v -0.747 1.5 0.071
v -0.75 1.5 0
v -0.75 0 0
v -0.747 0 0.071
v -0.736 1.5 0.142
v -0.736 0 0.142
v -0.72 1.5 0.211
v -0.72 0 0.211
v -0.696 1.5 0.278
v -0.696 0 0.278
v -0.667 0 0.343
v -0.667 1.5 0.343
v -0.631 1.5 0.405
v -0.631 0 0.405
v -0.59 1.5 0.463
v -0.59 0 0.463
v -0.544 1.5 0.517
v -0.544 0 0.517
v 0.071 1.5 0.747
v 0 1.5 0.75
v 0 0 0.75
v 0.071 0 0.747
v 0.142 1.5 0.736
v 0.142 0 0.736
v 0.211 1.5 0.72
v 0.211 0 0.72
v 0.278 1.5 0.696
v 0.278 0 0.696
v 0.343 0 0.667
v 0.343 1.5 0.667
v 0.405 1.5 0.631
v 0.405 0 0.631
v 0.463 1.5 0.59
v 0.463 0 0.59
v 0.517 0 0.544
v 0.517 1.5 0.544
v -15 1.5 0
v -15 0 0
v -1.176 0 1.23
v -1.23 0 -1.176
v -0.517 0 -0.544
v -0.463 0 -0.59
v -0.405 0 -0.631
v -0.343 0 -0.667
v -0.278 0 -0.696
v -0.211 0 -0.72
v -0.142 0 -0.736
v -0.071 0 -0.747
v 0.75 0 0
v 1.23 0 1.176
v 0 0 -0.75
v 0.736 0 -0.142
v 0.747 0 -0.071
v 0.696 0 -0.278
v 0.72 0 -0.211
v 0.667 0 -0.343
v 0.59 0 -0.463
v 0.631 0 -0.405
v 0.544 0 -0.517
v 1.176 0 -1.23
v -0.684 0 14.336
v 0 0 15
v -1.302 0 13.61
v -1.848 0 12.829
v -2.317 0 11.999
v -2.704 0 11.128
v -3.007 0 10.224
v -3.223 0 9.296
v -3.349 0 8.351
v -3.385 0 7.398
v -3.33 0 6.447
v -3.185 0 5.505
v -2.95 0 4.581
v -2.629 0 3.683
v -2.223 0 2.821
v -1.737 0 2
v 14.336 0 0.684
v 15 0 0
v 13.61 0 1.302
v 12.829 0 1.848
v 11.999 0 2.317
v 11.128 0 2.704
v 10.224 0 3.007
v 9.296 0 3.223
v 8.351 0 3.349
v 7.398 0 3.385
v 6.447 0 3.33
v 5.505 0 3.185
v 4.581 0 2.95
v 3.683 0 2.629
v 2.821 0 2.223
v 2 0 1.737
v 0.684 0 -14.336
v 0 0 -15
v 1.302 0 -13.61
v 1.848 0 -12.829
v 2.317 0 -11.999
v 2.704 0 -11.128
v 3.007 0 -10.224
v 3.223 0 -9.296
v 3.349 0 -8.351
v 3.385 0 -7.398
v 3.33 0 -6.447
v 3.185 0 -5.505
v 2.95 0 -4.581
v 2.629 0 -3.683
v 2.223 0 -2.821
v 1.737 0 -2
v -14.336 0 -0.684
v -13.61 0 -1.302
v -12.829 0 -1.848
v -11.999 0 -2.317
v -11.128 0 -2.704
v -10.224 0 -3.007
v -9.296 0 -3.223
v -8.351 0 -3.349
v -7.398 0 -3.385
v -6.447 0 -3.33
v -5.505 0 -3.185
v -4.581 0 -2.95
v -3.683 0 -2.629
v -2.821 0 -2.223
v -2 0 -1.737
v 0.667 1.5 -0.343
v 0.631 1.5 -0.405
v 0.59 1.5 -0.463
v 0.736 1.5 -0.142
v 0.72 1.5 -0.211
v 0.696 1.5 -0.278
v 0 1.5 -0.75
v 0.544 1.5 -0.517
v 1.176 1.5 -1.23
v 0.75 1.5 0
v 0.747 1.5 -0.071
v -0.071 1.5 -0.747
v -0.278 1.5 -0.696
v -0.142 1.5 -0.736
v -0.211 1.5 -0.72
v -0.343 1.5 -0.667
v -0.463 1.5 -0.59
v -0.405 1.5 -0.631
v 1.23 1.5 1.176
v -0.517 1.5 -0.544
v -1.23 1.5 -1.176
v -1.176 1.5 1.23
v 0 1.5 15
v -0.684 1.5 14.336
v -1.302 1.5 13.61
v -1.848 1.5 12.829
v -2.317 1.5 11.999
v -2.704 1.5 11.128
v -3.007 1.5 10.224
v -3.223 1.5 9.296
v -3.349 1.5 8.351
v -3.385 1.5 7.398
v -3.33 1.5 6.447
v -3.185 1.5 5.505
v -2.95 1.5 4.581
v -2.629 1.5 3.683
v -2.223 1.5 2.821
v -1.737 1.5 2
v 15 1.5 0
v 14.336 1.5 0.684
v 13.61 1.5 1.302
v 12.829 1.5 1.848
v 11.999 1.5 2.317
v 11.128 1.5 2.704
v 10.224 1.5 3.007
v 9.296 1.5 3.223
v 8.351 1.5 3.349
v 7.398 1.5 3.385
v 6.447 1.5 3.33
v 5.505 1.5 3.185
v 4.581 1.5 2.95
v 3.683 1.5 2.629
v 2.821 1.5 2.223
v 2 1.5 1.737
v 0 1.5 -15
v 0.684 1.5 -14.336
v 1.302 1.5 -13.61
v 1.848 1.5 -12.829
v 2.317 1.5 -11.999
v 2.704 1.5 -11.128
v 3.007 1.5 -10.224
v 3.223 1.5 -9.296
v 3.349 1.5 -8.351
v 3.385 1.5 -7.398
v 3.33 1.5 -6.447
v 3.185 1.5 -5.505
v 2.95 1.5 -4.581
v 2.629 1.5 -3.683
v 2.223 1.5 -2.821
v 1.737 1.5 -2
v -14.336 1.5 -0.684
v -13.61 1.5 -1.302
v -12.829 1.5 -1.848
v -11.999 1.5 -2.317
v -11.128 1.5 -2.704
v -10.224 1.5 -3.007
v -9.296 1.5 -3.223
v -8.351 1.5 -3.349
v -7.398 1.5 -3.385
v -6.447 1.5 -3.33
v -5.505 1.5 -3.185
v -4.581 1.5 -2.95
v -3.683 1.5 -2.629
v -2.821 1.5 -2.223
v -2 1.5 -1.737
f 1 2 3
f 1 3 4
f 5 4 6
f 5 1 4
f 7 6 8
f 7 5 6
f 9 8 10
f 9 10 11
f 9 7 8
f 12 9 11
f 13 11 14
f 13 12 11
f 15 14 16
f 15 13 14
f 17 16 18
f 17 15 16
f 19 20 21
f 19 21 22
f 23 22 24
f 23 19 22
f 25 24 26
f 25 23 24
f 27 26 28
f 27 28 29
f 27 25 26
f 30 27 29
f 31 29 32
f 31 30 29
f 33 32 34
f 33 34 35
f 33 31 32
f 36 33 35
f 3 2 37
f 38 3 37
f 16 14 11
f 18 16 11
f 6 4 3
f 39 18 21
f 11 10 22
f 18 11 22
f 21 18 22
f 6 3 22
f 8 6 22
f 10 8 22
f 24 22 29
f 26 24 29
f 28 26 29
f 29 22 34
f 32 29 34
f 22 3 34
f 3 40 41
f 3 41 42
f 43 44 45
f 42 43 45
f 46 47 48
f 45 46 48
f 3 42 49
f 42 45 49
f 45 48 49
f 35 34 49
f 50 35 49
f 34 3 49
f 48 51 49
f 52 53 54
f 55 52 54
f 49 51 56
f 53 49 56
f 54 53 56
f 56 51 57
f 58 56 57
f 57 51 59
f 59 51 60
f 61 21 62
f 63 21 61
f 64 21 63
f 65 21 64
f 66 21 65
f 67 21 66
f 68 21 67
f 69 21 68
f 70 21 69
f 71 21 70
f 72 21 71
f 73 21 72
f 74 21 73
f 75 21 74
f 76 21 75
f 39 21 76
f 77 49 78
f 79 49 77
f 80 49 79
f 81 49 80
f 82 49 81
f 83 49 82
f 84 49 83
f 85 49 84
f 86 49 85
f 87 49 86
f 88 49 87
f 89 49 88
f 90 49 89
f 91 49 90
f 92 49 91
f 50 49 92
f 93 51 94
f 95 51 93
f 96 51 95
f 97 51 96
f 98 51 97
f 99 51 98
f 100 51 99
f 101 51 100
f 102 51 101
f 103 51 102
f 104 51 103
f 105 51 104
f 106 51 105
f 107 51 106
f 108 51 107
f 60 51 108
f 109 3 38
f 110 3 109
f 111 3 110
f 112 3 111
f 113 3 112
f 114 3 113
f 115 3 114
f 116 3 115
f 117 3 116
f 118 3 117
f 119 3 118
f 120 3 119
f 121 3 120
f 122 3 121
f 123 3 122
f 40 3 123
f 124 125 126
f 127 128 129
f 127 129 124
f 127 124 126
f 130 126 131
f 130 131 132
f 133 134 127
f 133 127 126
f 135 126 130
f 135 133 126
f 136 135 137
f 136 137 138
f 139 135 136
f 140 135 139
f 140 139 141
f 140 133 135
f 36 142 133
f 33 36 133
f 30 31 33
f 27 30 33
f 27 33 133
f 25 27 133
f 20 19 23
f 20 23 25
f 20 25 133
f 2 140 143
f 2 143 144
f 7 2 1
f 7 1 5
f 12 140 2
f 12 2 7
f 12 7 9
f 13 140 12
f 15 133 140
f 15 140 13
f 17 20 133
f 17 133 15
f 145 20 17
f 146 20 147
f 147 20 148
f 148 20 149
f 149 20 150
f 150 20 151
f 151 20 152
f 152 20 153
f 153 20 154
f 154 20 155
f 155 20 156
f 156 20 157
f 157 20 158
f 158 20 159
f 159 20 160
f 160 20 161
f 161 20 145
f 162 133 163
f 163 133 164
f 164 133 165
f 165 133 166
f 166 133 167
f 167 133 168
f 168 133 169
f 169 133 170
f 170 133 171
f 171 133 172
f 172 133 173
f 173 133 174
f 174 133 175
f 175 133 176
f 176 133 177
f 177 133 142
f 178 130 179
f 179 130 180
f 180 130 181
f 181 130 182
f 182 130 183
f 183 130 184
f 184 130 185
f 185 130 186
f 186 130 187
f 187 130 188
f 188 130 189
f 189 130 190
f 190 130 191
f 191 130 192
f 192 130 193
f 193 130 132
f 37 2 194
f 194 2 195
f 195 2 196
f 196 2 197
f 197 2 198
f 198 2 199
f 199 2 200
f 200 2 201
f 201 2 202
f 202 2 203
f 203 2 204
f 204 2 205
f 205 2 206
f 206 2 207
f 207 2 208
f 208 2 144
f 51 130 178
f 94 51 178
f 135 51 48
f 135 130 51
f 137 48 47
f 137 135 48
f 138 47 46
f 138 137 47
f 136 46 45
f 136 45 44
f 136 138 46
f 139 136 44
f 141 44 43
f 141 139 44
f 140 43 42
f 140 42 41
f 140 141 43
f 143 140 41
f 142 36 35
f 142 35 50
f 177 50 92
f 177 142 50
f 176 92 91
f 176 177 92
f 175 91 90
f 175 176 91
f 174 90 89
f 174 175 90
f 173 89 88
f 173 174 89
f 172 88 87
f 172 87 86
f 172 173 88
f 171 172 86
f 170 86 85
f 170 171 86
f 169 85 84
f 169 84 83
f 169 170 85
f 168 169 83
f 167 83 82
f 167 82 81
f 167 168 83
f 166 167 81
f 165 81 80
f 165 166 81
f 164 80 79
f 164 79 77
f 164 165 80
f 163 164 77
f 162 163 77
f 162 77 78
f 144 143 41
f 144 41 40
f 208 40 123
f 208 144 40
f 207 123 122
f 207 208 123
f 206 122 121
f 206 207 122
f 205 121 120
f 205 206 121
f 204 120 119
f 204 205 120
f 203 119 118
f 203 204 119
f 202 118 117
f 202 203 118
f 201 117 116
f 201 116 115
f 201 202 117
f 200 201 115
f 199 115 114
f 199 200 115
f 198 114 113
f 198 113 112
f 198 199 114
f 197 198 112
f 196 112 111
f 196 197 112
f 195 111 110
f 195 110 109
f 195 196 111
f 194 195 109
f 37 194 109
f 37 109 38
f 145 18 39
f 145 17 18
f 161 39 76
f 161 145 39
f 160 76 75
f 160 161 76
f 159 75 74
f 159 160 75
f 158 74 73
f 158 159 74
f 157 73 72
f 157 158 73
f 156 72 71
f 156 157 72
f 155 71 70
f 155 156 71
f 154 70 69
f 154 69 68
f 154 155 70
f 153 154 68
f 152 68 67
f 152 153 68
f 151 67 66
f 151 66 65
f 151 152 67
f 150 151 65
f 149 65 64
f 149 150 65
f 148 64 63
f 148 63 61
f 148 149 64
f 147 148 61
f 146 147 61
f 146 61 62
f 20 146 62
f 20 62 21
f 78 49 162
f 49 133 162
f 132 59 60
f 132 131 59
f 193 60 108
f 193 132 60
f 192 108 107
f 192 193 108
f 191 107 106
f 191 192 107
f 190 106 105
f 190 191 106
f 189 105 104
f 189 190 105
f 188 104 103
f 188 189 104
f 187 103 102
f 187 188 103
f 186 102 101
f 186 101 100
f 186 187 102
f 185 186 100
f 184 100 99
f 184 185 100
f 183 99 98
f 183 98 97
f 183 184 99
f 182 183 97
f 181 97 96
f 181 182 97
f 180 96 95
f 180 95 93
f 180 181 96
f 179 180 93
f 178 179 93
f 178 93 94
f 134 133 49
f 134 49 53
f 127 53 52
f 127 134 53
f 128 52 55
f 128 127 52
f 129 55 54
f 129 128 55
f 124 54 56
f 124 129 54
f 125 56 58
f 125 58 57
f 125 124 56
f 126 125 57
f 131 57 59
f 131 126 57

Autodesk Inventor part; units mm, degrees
ref_plane "YZ Plane" through (0, 0, 0) normal (1, 0, 0) x (0, 1, 0)
ref_plane "XZ Plane" through (0, 0, 0) normal (0, 1, 0) x (-1, 0, 0)
ref_plane "XY Plane" through (0, 0, 0) normal (0, 0, 1) x (1, 0, 0)
sketch "스케치6" plane through (0, 0, 0) normal (0, 1, 0) x (-1, 0, 0)
  circle A0 centre (0, 0) radius 15
  dimension "d16" = 30
extrude "돌출4" add sketch "스케치6" along normal blind 1.5
sketch "스케치7" plane through (0, 1.5, 0) normal (0, 1, 0) x (1, 0, 0)
  circle A0 centre (0, 0) radius 15 projected
  arc A1 (0, 0) -> (-15, 0) centre (-7.5, -6.6144) ccw
  arc A2 (0, 0) -> (0, 15) centre (-6.6144, 7.5) ccw
  arc A3 (0, 0) -> (15, 0) centre (7.5, 6.6144) ccw
  arc A4 (0, 0) -> (0, -15) centre (6.6144, -7.5) ccw
  line L0 (0, -15) -> (0, 0)
  line L1 (0, 0) -> (15, 0)
  line L2 (0, 0) -> (0, 15)
  line L3 (0, 0) -> (-15, 0)
  arc A5 (-15, 0) -> (0, -15) centre (0, 0) ccw
  arc A6 (0, -15) -> (15, 0) centre (0, 0) ccw
  arc A7 (15, 0) -> (0, 15) centre (0, 0) ccw
  arc A8 (0, 15) -> (-15, 0) centre (0, 0) ccw
  point P0 (0, -15)
  point P1 (0, -15)
  dimension "d19" = 10
  dimension "d20" = 10
  dimension "d21" = 10
  dimension "d22" = 10
  dimension "d23" = 15
  dimension "d24" = 15
extrude "돌출5" cut sketch "스케치7" against normal blind 1.5 contours L1 A2 A0 | A0 L0 A3 | L2 A1 A0 | A0 L3 A4
sketch "스케치8" plane through (0, 1.5, 0) normal (0, 1, 0) x (1, 0, 0)
  arc A0 (0, 0) -> (0, -15) centre (6.6144, -7.5) ccw projected
  circle A1 centre (0, 0) radius 0.75
  dimension "d27" = 1.5
extrude "돌출6" add sketch "스케치8" against normal blind 1.5
sketch "스케치9" plane through (0, 1.5, 0) normal (0, 1, 0) x (1, 0, 0)
  point P0 (0, 0)
properties part number "fan_num4_1"
